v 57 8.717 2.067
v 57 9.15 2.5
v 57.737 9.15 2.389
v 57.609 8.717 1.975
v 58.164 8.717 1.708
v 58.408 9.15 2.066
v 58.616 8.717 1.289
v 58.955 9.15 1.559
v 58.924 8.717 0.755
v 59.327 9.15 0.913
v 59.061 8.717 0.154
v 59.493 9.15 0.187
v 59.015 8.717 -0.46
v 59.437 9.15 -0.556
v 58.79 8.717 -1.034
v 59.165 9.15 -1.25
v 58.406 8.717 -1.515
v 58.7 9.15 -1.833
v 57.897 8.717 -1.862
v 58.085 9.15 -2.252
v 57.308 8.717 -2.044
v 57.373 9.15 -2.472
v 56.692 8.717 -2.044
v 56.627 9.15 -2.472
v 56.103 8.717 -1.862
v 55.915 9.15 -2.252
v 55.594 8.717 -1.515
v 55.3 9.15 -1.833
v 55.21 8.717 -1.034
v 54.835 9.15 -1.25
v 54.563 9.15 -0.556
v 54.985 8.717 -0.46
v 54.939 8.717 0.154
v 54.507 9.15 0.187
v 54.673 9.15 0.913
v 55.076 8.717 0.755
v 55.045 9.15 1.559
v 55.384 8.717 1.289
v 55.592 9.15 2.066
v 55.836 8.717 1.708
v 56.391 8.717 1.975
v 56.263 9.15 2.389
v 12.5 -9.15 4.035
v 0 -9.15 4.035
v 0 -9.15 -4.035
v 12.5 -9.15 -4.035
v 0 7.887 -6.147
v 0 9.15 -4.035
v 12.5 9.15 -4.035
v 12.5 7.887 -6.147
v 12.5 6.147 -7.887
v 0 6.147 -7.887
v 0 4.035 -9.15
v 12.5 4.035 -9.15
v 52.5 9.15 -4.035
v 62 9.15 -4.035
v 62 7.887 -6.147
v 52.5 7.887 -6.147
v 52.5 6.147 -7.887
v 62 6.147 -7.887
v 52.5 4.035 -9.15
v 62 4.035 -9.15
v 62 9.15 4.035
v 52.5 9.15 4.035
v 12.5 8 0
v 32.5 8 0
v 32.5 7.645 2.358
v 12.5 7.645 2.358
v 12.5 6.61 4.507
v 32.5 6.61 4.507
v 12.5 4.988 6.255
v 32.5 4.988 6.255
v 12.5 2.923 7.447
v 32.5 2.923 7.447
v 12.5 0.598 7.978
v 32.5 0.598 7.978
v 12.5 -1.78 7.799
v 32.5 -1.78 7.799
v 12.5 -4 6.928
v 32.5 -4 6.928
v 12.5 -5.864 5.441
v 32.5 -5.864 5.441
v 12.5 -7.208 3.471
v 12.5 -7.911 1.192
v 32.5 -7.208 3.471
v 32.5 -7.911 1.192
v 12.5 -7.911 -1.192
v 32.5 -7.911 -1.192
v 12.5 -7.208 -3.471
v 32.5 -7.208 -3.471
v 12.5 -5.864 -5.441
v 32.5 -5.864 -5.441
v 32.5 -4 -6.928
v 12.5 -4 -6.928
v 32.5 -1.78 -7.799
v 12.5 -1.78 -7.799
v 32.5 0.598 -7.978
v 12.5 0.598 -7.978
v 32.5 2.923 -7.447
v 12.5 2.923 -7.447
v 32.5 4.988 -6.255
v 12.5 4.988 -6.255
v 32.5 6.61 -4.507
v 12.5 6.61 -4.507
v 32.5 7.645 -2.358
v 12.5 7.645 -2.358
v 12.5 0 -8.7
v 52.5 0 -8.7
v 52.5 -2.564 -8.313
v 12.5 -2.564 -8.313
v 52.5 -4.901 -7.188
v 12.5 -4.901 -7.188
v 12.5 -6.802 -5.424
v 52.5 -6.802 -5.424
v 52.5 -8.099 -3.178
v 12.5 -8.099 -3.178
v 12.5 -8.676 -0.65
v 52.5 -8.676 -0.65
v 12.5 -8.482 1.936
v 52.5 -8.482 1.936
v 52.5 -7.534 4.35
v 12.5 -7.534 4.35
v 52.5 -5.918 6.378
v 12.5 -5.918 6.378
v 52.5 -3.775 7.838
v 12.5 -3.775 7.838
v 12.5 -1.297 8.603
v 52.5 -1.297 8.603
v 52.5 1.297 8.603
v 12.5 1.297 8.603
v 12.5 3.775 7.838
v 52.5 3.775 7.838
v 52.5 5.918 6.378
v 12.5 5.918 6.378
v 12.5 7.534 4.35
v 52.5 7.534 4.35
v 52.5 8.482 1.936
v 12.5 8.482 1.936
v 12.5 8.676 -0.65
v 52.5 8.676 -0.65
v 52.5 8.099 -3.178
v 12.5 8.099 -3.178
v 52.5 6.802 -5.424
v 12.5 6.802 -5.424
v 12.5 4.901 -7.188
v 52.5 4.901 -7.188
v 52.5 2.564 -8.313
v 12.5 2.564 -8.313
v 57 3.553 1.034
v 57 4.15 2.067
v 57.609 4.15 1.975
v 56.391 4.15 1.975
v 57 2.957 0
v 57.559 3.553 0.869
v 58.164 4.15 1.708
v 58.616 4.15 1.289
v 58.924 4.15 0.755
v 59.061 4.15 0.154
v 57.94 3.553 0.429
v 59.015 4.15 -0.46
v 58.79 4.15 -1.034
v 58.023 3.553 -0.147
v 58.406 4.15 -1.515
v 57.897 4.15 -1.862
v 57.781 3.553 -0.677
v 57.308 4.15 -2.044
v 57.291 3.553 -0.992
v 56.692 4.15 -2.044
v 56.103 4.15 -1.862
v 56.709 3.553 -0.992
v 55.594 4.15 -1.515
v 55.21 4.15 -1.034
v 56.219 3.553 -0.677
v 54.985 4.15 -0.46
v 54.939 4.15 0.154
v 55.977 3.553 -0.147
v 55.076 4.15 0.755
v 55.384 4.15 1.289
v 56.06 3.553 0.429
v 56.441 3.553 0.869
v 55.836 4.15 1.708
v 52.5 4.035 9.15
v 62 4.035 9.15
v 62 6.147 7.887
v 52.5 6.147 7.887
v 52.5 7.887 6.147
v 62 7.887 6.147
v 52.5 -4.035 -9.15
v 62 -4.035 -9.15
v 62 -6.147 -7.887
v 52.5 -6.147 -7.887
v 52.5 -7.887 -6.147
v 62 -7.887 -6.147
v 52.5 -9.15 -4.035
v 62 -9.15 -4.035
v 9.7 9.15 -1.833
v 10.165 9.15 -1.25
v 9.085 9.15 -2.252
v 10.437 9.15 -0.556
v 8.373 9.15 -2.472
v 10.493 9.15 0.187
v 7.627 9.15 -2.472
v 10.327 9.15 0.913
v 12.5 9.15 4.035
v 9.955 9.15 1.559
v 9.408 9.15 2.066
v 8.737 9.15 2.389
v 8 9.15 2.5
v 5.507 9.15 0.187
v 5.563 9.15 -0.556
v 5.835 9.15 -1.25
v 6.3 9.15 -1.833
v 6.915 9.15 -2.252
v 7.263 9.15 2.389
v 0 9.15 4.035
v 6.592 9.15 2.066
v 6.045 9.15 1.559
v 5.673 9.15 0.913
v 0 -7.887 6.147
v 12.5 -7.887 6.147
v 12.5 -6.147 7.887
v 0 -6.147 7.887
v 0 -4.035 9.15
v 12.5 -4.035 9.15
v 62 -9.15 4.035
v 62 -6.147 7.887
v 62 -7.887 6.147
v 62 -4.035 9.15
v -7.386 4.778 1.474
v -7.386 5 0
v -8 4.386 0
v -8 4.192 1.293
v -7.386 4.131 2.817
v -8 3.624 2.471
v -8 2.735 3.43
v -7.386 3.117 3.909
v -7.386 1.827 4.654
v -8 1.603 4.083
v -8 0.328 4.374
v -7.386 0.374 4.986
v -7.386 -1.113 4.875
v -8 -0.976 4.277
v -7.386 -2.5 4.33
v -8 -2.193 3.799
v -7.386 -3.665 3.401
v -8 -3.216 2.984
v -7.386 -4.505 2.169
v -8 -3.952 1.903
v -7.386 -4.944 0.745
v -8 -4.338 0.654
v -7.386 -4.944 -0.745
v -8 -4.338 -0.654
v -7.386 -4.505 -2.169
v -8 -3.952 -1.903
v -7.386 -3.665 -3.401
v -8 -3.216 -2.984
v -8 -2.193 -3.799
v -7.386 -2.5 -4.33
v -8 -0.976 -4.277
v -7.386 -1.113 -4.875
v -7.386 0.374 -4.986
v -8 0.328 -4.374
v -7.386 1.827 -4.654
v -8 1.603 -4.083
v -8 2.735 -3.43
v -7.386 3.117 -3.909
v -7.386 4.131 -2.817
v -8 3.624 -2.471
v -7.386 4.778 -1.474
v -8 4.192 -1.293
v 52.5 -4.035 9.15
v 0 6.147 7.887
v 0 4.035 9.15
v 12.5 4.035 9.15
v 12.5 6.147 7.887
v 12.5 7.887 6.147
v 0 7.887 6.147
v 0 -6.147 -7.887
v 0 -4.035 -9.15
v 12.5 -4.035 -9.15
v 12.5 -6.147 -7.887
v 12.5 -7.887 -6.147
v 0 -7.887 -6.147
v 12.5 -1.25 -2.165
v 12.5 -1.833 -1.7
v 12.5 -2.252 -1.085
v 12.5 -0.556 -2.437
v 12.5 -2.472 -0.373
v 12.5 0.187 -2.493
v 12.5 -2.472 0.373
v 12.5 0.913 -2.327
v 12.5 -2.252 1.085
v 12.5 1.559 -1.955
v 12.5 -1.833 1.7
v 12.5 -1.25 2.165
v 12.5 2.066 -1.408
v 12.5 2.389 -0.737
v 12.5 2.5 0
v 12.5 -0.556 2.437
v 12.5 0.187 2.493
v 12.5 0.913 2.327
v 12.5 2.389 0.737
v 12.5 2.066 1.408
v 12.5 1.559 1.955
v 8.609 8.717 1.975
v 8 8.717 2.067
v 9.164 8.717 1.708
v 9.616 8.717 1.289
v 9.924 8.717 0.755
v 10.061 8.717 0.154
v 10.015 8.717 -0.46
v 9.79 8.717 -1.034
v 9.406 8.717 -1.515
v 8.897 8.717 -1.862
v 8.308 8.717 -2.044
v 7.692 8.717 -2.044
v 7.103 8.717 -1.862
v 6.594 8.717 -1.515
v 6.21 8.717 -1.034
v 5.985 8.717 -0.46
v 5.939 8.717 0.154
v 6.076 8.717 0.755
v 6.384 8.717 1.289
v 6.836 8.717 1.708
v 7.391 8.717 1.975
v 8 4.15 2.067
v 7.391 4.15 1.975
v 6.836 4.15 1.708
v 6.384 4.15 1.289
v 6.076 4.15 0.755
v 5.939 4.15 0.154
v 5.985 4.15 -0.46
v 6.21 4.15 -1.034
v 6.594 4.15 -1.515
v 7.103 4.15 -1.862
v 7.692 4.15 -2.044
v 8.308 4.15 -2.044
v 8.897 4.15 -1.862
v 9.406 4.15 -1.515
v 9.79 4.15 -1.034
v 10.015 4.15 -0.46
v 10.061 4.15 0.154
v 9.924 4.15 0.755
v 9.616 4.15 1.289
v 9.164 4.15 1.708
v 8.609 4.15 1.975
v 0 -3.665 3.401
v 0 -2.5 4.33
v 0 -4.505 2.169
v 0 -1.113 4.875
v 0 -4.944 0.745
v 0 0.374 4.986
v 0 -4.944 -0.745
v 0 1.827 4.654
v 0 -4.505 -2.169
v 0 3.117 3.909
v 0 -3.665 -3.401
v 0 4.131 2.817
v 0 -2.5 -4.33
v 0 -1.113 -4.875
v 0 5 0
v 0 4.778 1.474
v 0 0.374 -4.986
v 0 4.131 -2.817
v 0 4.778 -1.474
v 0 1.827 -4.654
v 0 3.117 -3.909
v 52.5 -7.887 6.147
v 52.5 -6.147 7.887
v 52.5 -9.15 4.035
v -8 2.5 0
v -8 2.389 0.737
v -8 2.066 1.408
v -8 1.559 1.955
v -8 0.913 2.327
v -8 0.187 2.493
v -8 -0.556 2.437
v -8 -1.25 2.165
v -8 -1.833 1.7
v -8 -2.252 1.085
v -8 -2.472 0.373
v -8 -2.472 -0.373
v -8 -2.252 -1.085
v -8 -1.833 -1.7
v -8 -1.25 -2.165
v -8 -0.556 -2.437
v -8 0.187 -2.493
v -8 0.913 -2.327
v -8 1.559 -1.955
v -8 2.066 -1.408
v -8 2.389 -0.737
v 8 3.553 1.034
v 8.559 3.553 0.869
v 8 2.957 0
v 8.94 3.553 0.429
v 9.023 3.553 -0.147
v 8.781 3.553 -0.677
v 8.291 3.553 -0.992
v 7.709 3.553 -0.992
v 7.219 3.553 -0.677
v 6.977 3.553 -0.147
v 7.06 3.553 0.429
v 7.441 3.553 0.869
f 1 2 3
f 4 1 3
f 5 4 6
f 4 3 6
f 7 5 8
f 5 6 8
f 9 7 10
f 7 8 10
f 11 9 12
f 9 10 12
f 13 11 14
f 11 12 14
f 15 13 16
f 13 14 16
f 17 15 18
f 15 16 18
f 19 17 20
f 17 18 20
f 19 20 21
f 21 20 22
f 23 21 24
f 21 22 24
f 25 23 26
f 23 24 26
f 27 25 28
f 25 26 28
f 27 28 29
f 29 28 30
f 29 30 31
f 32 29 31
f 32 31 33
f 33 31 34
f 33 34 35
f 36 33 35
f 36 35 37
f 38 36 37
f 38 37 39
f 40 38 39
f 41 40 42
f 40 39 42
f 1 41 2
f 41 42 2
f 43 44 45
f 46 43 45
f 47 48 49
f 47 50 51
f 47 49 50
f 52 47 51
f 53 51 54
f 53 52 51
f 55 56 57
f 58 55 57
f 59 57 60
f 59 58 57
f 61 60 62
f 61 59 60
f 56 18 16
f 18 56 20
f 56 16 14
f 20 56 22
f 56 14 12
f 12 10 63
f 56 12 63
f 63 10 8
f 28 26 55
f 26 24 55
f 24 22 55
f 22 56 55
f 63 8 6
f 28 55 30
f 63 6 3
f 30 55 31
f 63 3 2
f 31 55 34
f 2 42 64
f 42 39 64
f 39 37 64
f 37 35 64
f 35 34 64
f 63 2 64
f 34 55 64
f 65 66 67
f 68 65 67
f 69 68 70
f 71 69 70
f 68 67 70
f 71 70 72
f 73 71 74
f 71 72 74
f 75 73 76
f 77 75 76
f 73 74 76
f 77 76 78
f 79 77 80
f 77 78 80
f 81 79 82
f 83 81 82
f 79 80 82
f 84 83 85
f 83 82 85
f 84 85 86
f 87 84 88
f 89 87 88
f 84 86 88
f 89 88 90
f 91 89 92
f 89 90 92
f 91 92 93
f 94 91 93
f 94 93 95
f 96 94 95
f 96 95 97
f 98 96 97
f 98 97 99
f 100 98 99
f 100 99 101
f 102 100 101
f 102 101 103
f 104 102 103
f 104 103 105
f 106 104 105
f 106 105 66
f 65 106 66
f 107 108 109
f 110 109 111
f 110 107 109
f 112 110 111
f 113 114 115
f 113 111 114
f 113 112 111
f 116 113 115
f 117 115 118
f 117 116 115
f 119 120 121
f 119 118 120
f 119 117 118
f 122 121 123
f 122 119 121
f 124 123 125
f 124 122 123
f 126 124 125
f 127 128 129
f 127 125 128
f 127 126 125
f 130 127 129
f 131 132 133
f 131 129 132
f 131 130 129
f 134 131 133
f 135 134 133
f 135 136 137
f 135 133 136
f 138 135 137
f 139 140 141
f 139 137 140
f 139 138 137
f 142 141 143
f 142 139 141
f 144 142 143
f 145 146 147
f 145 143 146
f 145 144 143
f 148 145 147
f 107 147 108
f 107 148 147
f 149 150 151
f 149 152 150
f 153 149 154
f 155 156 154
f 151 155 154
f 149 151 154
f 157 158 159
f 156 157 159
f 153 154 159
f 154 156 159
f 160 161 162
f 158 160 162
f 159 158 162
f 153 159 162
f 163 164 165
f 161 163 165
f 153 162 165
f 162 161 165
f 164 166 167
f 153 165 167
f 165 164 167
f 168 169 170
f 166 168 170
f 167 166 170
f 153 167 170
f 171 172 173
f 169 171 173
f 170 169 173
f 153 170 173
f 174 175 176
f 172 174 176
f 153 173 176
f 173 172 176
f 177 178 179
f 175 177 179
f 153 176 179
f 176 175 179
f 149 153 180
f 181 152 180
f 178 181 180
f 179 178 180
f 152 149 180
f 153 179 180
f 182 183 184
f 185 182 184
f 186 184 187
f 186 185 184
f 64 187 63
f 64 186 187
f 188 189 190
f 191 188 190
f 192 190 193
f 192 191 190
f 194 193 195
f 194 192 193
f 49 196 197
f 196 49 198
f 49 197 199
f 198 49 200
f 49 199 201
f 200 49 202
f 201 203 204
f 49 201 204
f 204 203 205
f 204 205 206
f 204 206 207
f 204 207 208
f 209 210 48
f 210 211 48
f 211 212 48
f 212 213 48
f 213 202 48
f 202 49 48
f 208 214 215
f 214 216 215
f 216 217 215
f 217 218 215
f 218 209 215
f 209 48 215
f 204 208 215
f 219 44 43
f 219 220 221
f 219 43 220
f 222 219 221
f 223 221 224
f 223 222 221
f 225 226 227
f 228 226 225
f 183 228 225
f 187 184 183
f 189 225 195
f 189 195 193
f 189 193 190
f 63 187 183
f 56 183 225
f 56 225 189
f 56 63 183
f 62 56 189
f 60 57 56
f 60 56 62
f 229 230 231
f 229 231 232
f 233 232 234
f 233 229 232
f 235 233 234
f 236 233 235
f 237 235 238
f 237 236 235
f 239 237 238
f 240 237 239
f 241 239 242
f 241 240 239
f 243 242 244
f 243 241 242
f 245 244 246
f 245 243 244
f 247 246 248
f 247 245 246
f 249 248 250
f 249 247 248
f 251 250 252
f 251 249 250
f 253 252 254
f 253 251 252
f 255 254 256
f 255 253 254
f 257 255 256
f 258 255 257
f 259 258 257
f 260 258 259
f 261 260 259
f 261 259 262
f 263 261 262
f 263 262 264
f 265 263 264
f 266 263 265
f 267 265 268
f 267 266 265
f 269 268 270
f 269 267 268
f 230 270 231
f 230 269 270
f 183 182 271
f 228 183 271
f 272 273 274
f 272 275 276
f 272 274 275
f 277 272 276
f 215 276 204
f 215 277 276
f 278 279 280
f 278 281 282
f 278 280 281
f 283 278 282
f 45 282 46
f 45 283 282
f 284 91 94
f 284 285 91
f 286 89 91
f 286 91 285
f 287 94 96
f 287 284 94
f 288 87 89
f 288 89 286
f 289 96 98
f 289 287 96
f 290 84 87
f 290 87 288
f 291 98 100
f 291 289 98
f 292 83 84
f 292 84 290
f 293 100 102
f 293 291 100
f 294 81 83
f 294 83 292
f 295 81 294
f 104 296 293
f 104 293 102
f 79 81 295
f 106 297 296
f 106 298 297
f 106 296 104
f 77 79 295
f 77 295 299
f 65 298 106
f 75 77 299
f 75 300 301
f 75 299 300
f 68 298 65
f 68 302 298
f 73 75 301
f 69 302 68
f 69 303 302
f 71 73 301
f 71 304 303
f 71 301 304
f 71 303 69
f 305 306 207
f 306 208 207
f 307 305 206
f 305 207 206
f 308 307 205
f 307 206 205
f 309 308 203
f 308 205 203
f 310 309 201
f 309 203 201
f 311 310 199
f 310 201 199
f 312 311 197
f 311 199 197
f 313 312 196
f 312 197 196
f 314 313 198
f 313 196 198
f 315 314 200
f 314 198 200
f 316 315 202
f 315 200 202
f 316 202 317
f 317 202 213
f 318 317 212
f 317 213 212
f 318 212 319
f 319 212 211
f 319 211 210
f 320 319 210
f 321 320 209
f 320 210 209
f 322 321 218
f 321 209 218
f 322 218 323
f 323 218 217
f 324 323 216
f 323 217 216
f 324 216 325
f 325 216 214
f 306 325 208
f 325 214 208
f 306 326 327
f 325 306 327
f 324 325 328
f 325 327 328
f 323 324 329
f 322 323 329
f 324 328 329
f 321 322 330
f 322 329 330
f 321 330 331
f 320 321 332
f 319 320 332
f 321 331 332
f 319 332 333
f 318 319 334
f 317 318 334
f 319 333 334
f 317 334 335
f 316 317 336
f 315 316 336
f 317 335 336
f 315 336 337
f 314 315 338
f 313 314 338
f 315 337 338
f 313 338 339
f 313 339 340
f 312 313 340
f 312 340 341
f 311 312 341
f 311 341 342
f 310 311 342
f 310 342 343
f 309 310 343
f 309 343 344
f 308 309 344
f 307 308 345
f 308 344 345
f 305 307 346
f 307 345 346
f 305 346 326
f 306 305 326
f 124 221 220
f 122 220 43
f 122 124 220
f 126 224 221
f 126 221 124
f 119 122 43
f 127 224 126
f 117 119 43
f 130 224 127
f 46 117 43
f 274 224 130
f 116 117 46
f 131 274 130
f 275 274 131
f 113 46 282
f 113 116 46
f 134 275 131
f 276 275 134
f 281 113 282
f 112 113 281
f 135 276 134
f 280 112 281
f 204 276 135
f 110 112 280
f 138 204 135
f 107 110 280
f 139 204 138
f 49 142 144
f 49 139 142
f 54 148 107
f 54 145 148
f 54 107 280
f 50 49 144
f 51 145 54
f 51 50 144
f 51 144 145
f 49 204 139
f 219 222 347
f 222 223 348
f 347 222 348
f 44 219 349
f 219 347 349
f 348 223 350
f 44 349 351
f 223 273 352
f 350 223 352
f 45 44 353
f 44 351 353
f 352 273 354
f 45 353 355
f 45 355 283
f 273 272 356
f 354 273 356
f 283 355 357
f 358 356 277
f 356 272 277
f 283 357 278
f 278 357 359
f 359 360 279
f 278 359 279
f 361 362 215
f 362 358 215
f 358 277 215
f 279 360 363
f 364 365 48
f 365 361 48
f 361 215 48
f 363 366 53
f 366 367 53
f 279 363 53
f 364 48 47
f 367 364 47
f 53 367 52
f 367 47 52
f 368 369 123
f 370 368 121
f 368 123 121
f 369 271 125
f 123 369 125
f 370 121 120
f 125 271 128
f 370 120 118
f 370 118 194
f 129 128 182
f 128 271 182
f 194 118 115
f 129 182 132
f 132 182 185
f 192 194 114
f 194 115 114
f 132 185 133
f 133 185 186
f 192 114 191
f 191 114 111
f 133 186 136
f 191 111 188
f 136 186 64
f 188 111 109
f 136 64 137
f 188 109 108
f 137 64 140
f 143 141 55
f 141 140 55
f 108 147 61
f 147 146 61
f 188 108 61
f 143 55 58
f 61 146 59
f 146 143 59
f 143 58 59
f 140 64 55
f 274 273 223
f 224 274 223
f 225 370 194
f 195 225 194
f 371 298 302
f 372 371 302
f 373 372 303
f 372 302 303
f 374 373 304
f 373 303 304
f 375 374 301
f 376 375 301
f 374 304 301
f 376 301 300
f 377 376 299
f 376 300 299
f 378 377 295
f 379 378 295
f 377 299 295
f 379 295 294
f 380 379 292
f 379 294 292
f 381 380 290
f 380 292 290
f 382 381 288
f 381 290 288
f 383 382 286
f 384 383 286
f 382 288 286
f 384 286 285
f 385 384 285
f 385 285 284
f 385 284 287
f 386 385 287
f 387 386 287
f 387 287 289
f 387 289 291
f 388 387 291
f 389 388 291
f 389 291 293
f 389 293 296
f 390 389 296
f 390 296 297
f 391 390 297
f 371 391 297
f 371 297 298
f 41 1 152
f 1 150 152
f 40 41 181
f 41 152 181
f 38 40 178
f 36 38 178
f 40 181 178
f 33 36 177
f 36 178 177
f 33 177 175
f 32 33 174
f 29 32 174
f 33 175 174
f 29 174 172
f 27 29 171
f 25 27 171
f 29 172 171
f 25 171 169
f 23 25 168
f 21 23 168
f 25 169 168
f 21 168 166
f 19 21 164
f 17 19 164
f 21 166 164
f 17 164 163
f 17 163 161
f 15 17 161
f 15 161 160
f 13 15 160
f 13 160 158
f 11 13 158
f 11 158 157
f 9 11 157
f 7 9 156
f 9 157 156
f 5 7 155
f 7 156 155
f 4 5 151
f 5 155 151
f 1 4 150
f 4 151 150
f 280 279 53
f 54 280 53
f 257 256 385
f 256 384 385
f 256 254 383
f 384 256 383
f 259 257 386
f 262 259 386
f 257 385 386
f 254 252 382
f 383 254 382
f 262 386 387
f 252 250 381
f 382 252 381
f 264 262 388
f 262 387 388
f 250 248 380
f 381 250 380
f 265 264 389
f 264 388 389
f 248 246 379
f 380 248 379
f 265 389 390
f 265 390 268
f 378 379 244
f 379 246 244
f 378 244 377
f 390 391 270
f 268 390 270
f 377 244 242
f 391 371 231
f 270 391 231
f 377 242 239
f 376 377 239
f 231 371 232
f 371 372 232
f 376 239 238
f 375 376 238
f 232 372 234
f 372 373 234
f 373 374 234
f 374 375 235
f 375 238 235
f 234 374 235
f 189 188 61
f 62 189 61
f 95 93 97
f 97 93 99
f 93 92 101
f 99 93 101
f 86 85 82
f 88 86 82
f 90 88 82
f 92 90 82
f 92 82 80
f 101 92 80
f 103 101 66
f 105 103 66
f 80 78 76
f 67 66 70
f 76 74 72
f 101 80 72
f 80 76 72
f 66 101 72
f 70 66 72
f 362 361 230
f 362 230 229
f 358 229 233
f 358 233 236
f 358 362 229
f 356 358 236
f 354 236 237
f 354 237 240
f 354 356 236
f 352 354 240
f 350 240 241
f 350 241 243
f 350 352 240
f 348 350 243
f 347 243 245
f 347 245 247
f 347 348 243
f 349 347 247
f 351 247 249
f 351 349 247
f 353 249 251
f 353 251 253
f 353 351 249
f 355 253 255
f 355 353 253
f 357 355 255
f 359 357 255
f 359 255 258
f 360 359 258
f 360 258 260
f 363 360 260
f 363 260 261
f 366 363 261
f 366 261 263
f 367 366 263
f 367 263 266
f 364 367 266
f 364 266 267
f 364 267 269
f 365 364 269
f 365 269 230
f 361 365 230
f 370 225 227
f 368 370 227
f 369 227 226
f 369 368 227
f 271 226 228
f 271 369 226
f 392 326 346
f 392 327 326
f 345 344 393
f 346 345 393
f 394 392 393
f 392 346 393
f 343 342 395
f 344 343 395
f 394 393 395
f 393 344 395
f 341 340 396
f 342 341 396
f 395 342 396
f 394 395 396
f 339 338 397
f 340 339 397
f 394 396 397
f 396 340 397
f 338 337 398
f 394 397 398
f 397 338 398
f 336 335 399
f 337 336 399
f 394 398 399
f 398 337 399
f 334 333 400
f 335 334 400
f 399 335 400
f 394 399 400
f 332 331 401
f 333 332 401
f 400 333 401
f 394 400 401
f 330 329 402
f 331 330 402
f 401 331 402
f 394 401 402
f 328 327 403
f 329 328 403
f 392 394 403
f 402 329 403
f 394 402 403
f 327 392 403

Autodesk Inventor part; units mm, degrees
sketch "Sketch_8" plane through (0, 0, 0) normal (0, 0, 1) x (1, 0, 0)
  line L0 (0, 0) -> (-8, 0)
  line L1 (-8, 0) -> (-8, 4.3865)
  line L2 (-8, 4.3865) -> (-7.3865, 5)
  line L3 (-7.3865, 5) -> (0, 5)
  line L4 (0, 5) -> (0, 0)
  line L5 (0, 0) -> (-8, 0)
revolve "Revolution1" add sketch "Sketch_8" angle 360 about axis through (0, 0, 0) along (1, 0, 0)
thread "Thread1" size "M10x1" class "6g" standard "ISO Metric profile" length 5.8865
sketch "Sketch_9" plane through (0, 0, 0) normal (1, 0, 0) x (0, 0, -1)
  line L0 (-9.15, 4.0345) -> (-9.15, -4.0345)
  arc A0 (-9.15, -4.0345) -> (-4.0345, -9.15) centre (0, 0) ccw
  line L1 (-4.0345, -9.15) -> (4.0345, -9.15)
  arc A1 (4.0345, -9.15) -> (9.15, -4.0345) centre (0, 0) ccw
  line L2 (9.15, -4.0345) -> (9.15, 4.0345)
  arc A2 (9.15, 4.0345) -> (4.0345, 9.15) centre (0, 0) ccw
  line L3 (4.0345, 9.15) -> (-4.0345, 9.15)
  arc A3 (-4.0345, 9.15) -> (-9.15, 4.0345) centre (0, 0) ccw
extrude "Extrusion1" add sketch "Sketch_9" along normal blind 12.5
sketch "Sketch_11" plane through (12.5, 0, 0) normal (1, 0, 0) x (0, 0, -1)
  circle A0 centre (0, 0) radius 8.7
extrude "Extrusion2" add sketch "Sketch_11" along normal blind 40
sketch "Sketch_10" plane through (52.5, 0, 0) normal (1, 0, 0) x (0, 0, -1)
  line L0 (-9.15, 4.0345) -> (-9.15, -4.0345)
  arc A0 (-9.15, -4.0345) -> (-4.0345, -9.15) centre (0, 0) ccw
  line L1 (-4.0345, -9.15) -> (4.0345, -9.15)
  arc A1 (4.0345, -9.15) -> (9.15, -4.0345) centre (0, 0) ccw
  line L2 (9.15, -4.0345) -> (9.15, 4.0345)
  arc A2 (9.15, 4.0345) -> (4.0345, 9.15) centre (0, 0) ccw
  line L3 (4.0345, 9.15) -> (-4.0345, 9.15)
  arc A3 (-4.0345, 9.15) -> (-9.15, 4.0345) centre (0, 0) ccw
extrude "Extrusion3" add sketch "Sketch_10" along normal blind 9.5
sketch "Sketch5" plane through (0, 9.15, 4.0345) normal (0, 1, 0) x (1, 0, 0)
  point P0 (8, 4.0345)
hole "Hole1" at (8, 9.15, 0) direction (0, -1, 0) diameter 4.134 depth 5 tip angle 120 countersink diameter 5 countersink angle 90 thread size "M5x0.8" class "6H" standard "ISO Metric profile"
sketch "Sketch6" plane through (52.5, 9.15, 4.0345) normal (0, 1, 0) x (1, 0, 0)
  point P0 (4.5, 4.0345)
hole "Hole2" at (57, 9.15, 0) direction (0, -1, 0) diameter 4.134 depth 5 tip angle 120 countersink diameter 5 countersink angle 90 thread size "M5x0.8" class "6H" standard "ISO Metric profile"
sketch "Sketch_16" plane through (0, 0, 0) normal (0, 0, 1) x (1, 0, 0)
  line L0 (32.5, 0) -> (-8, 0)
  line L1 (-8, 0) -> (-8, 2.5)
  line L2 (-8, 2.5) -> (12.5, 2.5)
  line L3 (12.5, 2.5) -> (12.5, 8)
  line L4 (12.5, 8) -> (32.5, 8)
  line L5 (32.5, 8) -> (32.5, 0)
  line L6 (32.5, 0) -> (-8, 0)
revolve "Revolution2" cut sketch "Sketch_16" angle 360 about axis through (32.5, 0, 0) along (1, 0, 0)
ref_plane "BODY_N_XY" through (62, 0, 0) normal (0, 0, -1) x (1, 0, 0)
ref_plane "BODY_N_YZ" through (62, 0, 0) normal (1, 0, 0) x (0, -1, 0)
ref_plane "BODY_N_ZX" through (62, 0, 0) normal (0, -1, 0) x (0, 0, -1)
ref_plane "NUT2_XY" through (62, 0, 0) normal (1, 0, 0) x (0, 0, -1)
ref_plane "NUT2_YZ" through (62, 0, 0) normal (0, 0, -1) x (0, 1, 0)
ref_plane "NUT2_ZX" through (62, 0, 0) normal (0, 1, 0) x (1, 0, 0)
ref_plane "SW1_XY" through (19, 0, 0) normal (1, 0, 0) x (0, 0, -1)
ref_plane "SW1_YZ" through (19, 0, 0) normal (0, 0, -1) x (0, 1, 0)
ref_plane "SW1_ZX" through (19, 0, 0) normal (0, 1, 0) x (1, 0, 0)
ref_plane "SW2_XY" through (46, 0, 0) normal (-1, 0, 0) x (0, 0, -1)
ref_plane "SW2_YZ" through (46, 0, 0) normal (0, 0, -1) x (0, -1, 0)
ref_plane "SW2_ZX" through (46, 0, 0) normal (0, -1, 0) x (-1, 0, 0)
ref_plane "SW_R1_XY" through (19, -14.15, 0) normal (1, 0, 0) x (0, 0, -1)
ref_plane "SW_R1_YZ" through (19, -14.15, 0) normal (0, 0, -1) x (0, 1, 0)
ref_plane "SW_R1_ZX" through (19, -14.15, 0) normal (0, 1, 0) x (1, 0, 0)
ref_plane "SW_R2_XY" through (46, -14.15, 0) normal (-1, 0, 0) x (0, 0, -1)
ref_plane "SW_R2_YZ" through (46, -14.15, 0) normal (0, 0, -1) x (0, -1, 0)
ref_plane "SW_R2_ZX" through (46, -14.15, 0) normal (0, -1, 0) x (-1, 0, 0)
ref_plane "body_XY" through (0, 0, 0) normal (-1, 0, 0) x (0, 0, -1)
ref_plane "body_YZ" through (0, 0, 0) normal (0, 0, -1) x (0, -1, 0)
ref_plane "body_ZX" through (0, 0, 0) normal (0, -1, 0) x (-1, 0, 0)
properties part number "CJ2B16-15Z-B(1_0)_BODY"
